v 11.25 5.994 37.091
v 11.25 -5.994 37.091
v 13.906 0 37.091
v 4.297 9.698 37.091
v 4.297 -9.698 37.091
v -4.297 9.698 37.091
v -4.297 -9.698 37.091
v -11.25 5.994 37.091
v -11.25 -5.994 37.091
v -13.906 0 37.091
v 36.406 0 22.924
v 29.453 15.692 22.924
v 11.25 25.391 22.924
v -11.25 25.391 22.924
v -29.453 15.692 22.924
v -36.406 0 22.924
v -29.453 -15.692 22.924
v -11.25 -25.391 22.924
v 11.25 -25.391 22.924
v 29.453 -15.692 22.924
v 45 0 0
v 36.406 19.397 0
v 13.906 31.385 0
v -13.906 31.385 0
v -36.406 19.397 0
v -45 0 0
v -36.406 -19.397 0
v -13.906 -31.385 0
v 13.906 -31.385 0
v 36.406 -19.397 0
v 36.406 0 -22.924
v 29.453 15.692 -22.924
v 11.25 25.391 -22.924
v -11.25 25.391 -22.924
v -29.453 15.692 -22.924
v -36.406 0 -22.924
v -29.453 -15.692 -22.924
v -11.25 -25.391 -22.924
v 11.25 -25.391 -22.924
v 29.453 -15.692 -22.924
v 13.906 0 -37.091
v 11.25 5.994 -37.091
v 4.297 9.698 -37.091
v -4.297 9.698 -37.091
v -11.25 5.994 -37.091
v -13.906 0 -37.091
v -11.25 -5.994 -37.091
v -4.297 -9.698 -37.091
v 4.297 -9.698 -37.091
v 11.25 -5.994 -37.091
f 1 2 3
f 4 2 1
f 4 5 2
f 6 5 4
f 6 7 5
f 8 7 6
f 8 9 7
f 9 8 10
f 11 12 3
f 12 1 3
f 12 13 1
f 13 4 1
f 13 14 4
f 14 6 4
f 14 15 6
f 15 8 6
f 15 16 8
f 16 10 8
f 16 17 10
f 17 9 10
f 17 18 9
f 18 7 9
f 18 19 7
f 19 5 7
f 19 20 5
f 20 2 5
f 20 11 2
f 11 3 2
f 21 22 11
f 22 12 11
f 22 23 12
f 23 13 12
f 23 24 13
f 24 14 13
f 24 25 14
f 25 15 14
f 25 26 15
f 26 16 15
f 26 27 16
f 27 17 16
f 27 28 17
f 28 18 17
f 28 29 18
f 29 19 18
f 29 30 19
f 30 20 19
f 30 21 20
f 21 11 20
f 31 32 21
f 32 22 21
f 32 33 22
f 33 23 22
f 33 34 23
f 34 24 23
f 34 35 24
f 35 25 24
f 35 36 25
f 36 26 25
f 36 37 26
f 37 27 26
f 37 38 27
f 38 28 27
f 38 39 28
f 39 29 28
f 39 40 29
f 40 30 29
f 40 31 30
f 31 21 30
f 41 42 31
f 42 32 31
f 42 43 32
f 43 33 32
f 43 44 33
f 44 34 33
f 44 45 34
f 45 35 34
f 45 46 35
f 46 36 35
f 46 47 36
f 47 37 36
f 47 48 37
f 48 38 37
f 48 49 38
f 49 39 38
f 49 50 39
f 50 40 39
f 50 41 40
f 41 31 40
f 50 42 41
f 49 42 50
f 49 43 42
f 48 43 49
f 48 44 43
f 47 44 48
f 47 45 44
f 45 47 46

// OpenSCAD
// Generated by SolidPython 1.0.1 on 2020-07-29 00:46:52


scale(v = [15, 11, 13]) {
	sphere(r = 3);
}
/***********************************************
*********      SolidPython code:      **********
************************************************
 
# import packages: SolidPython
from solid import *
from solid.utils import *
from itertools import chain, combinations, permutations


class Resize:

    def __init__(self, scad_file):
        self.scad_file = scad_file
        #self.scad_file = import_scad(scad_file)
        # cone/cylinder param:
        self.r1 = 0
        self.r2 = 0
        self.h = 0
        # rectangular prism param:
        self.w = 0
        self.l = 0
        # ellipse param:
        self.r = 0

    # import OpenScad code (file name corresponds to shape)


    # classify shape + parameters
    def assign(self, param1, param2, param3):
        if self.scad_file == 'cone.scad':
            self.r1 = param1
            self.r2 = param2
            self.h = param3
        elif self.scad_file == 'cylinder.scad':
            self.r1 = param1
            self.r2 = param2
            self.h = param3
        elif self.scad_file == 'rectangularPrism.scad':
            self.h = param1
            self.l = param2
            self.w = param3
        else:
            self.r = param1
            self.h = param2

    # resize parameters
    def iterate(self):
        x = range(3, 20, 2)
        i = 1
        if self.scad_file == 'cone.scad':
            tempList = list(permutations(x, 2))
            for temp in tempList:
                param1 = temp[0]
                param2 = temp[1]
                filepath = 'produced_scad_files/' + 'cone' + str(param1) + '_' + str(param2) + '_' + '.scad'
                scad_render_to_file(cylinder(h=param1, r1=param2, r2=0), filepath)

        elif self.scad_file == 'cylinder.scad':
            tempList = list(permutations(x, 3))
            for temp in tempList:
                param1 = temp[0]
                param2 = temp[1]
                filepath = 'produced_scad_files/' + 'cylinder' + str(param1) + '_' + str(param2) + '_' + '.scad'
                scad_render_to_file(cylinder(h=param1, r1=param2, r2=param2), filepath)

        elif self.scad_file == 'rectangularPrism.scad':
            tempList = list(permutations(x, 3))
            for temp in tempList:
                param1 = temp[0]
                param2 = temp[1]
                param3 = temp[2]
                filepath = 'produced_scad_files/' + 'rectangularPrism' + str(param1) + '_' + str(param2) + '_' + str(
                    param3) + '.scad'
                scad_render_to_file(cube(size=(param1, param2, param3)), filepath)

        elif self.scad_file == 'ellipse.scad':
            tempList = list(permutations(x, 4))
            for temp in tempList:
                param1 = temp[0]
                param2 = temp[1]
                param3 = temp[2]
                param4 = temp[3]
                filepath = 'produced_scad_files/' + 'ellipse' + str(param1) + '_' + str(param2) + '_' + str(param3) + '_' + str(param4) + '.scad'
                scad_render_to_file(scale([param1, param2, param3])(sphere(r=param4)), filepath)

    def render_to_scadfile(self):
        scad_render_to_file(scad, 'example.scad') 
 
************************************************/
